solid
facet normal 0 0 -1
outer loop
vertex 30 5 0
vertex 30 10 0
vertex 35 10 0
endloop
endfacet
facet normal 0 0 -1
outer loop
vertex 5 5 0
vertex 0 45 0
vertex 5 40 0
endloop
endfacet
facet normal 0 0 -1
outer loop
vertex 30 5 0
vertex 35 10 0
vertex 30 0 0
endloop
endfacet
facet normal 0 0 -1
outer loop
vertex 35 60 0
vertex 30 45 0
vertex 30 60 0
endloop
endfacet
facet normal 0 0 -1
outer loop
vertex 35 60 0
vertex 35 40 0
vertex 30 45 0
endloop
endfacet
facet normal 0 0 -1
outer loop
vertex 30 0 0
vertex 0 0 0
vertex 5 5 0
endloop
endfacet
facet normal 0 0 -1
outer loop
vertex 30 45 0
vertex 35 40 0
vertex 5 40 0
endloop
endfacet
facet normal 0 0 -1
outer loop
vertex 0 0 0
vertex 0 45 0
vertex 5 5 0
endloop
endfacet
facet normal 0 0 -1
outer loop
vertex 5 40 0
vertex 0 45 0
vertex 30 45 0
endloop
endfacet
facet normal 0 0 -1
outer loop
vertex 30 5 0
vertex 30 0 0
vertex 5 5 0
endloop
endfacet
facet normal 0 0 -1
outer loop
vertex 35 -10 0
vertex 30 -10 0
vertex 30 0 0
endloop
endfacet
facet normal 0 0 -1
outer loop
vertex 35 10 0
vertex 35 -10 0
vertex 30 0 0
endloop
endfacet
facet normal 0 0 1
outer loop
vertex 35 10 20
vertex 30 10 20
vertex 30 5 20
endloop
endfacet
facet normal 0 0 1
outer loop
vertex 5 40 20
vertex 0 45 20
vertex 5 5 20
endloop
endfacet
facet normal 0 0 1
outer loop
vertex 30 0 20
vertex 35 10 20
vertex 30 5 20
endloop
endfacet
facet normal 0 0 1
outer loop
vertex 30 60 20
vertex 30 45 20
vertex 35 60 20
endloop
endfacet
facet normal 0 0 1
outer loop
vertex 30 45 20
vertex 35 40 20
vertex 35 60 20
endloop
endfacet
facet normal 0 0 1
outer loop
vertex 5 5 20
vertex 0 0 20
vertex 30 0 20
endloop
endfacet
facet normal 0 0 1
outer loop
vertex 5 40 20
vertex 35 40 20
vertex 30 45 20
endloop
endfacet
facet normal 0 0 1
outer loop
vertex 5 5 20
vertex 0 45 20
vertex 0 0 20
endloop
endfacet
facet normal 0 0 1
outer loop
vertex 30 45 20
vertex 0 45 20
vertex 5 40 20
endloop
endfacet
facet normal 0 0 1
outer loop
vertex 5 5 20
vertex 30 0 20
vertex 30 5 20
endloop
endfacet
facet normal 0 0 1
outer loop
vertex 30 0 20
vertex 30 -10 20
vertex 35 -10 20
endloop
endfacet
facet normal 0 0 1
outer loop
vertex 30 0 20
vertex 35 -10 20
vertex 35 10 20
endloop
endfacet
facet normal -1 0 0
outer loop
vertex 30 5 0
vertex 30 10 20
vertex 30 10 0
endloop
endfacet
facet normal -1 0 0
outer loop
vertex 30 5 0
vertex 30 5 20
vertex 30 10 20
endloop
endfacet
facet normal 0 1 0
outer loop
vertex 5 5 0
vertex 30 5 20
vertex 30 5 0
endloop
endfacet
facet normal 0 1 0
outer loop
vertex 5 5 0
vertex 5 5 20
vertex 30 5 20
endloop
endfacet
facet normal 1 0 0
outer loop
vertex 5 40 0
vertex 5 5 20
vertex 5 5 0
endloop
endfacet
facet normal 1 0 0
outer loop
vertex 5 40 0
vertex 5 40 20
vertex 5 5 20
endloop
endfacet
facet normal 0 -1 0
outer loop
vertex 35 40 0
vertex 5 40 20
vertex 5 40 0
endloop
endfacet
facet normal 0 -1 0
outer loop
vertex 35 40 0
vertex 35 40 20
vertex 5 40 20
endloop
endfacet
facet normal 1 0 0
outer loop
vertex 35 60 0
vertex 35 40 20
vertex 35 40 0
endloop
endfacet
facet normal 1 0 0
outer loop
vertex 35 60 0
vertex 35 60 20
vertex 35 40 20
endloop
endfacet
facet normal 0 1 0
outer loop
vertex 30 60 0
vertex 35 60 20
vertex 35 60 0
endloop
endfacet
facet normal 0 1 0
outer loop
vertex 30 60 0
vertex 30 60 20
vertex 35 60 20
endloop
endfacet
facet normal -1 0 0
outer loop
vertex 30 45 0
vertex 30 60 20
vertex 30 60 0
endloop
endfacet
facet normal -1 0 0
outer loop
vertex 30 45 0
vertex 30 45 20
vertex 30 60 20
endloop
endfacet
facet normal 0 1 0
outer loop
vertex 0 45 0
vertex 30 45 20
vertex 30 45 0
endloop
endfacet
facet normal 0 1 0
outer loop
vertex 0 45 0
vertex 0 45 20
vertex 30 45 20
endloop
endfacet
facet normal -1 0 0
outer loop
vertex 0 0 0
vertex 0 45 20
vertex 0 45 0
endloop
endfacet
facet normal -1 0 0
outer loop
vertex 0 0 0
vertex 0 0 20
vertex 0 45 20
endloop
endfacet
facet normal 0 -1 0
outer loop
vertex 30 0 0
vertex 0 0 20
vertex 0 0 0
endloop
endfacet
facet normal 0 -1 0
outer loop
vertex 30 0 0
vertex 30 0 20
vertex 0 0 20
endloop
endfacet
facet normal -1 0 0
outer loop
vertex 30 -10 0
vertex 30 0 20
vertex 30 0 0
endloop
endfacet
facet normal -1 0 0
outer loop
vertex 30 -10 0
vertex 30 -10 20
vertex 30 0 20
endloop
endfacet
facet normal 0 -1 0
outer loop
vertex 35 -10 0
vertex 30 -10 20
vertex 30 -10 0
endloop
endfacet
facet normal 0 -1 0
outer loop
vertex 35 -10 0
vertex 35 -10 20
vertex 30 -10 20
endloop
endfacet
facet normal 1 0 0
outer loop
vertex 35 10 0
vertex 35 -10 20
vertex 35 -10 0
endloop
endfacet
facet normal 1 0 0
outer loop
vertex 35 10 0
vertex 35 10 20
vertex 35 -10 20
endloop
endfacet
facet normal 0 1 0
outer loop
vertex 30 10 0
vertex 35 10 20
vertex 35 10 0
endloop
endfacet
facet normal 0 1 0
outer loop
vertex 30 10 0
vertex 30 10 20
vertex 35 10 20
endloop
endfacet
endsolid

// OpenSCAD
width = 30;
depth = 35;

strength = 5;

pusher_w = 20;

puller_w = 20;

linear_extrude(height = 20) {
    difference() {
        square([width+(strength), depth+(strength*2)]);
        translate([strength, strength, 0]) {
            square([width, depth]);
        } 
    }
    translate([width, depth+strength]) {
        square([strength, pusher_w]);
    }
    translate([width, -(puller_w/2), 0]) {
        square([strength, puller_w]);
    }
}
